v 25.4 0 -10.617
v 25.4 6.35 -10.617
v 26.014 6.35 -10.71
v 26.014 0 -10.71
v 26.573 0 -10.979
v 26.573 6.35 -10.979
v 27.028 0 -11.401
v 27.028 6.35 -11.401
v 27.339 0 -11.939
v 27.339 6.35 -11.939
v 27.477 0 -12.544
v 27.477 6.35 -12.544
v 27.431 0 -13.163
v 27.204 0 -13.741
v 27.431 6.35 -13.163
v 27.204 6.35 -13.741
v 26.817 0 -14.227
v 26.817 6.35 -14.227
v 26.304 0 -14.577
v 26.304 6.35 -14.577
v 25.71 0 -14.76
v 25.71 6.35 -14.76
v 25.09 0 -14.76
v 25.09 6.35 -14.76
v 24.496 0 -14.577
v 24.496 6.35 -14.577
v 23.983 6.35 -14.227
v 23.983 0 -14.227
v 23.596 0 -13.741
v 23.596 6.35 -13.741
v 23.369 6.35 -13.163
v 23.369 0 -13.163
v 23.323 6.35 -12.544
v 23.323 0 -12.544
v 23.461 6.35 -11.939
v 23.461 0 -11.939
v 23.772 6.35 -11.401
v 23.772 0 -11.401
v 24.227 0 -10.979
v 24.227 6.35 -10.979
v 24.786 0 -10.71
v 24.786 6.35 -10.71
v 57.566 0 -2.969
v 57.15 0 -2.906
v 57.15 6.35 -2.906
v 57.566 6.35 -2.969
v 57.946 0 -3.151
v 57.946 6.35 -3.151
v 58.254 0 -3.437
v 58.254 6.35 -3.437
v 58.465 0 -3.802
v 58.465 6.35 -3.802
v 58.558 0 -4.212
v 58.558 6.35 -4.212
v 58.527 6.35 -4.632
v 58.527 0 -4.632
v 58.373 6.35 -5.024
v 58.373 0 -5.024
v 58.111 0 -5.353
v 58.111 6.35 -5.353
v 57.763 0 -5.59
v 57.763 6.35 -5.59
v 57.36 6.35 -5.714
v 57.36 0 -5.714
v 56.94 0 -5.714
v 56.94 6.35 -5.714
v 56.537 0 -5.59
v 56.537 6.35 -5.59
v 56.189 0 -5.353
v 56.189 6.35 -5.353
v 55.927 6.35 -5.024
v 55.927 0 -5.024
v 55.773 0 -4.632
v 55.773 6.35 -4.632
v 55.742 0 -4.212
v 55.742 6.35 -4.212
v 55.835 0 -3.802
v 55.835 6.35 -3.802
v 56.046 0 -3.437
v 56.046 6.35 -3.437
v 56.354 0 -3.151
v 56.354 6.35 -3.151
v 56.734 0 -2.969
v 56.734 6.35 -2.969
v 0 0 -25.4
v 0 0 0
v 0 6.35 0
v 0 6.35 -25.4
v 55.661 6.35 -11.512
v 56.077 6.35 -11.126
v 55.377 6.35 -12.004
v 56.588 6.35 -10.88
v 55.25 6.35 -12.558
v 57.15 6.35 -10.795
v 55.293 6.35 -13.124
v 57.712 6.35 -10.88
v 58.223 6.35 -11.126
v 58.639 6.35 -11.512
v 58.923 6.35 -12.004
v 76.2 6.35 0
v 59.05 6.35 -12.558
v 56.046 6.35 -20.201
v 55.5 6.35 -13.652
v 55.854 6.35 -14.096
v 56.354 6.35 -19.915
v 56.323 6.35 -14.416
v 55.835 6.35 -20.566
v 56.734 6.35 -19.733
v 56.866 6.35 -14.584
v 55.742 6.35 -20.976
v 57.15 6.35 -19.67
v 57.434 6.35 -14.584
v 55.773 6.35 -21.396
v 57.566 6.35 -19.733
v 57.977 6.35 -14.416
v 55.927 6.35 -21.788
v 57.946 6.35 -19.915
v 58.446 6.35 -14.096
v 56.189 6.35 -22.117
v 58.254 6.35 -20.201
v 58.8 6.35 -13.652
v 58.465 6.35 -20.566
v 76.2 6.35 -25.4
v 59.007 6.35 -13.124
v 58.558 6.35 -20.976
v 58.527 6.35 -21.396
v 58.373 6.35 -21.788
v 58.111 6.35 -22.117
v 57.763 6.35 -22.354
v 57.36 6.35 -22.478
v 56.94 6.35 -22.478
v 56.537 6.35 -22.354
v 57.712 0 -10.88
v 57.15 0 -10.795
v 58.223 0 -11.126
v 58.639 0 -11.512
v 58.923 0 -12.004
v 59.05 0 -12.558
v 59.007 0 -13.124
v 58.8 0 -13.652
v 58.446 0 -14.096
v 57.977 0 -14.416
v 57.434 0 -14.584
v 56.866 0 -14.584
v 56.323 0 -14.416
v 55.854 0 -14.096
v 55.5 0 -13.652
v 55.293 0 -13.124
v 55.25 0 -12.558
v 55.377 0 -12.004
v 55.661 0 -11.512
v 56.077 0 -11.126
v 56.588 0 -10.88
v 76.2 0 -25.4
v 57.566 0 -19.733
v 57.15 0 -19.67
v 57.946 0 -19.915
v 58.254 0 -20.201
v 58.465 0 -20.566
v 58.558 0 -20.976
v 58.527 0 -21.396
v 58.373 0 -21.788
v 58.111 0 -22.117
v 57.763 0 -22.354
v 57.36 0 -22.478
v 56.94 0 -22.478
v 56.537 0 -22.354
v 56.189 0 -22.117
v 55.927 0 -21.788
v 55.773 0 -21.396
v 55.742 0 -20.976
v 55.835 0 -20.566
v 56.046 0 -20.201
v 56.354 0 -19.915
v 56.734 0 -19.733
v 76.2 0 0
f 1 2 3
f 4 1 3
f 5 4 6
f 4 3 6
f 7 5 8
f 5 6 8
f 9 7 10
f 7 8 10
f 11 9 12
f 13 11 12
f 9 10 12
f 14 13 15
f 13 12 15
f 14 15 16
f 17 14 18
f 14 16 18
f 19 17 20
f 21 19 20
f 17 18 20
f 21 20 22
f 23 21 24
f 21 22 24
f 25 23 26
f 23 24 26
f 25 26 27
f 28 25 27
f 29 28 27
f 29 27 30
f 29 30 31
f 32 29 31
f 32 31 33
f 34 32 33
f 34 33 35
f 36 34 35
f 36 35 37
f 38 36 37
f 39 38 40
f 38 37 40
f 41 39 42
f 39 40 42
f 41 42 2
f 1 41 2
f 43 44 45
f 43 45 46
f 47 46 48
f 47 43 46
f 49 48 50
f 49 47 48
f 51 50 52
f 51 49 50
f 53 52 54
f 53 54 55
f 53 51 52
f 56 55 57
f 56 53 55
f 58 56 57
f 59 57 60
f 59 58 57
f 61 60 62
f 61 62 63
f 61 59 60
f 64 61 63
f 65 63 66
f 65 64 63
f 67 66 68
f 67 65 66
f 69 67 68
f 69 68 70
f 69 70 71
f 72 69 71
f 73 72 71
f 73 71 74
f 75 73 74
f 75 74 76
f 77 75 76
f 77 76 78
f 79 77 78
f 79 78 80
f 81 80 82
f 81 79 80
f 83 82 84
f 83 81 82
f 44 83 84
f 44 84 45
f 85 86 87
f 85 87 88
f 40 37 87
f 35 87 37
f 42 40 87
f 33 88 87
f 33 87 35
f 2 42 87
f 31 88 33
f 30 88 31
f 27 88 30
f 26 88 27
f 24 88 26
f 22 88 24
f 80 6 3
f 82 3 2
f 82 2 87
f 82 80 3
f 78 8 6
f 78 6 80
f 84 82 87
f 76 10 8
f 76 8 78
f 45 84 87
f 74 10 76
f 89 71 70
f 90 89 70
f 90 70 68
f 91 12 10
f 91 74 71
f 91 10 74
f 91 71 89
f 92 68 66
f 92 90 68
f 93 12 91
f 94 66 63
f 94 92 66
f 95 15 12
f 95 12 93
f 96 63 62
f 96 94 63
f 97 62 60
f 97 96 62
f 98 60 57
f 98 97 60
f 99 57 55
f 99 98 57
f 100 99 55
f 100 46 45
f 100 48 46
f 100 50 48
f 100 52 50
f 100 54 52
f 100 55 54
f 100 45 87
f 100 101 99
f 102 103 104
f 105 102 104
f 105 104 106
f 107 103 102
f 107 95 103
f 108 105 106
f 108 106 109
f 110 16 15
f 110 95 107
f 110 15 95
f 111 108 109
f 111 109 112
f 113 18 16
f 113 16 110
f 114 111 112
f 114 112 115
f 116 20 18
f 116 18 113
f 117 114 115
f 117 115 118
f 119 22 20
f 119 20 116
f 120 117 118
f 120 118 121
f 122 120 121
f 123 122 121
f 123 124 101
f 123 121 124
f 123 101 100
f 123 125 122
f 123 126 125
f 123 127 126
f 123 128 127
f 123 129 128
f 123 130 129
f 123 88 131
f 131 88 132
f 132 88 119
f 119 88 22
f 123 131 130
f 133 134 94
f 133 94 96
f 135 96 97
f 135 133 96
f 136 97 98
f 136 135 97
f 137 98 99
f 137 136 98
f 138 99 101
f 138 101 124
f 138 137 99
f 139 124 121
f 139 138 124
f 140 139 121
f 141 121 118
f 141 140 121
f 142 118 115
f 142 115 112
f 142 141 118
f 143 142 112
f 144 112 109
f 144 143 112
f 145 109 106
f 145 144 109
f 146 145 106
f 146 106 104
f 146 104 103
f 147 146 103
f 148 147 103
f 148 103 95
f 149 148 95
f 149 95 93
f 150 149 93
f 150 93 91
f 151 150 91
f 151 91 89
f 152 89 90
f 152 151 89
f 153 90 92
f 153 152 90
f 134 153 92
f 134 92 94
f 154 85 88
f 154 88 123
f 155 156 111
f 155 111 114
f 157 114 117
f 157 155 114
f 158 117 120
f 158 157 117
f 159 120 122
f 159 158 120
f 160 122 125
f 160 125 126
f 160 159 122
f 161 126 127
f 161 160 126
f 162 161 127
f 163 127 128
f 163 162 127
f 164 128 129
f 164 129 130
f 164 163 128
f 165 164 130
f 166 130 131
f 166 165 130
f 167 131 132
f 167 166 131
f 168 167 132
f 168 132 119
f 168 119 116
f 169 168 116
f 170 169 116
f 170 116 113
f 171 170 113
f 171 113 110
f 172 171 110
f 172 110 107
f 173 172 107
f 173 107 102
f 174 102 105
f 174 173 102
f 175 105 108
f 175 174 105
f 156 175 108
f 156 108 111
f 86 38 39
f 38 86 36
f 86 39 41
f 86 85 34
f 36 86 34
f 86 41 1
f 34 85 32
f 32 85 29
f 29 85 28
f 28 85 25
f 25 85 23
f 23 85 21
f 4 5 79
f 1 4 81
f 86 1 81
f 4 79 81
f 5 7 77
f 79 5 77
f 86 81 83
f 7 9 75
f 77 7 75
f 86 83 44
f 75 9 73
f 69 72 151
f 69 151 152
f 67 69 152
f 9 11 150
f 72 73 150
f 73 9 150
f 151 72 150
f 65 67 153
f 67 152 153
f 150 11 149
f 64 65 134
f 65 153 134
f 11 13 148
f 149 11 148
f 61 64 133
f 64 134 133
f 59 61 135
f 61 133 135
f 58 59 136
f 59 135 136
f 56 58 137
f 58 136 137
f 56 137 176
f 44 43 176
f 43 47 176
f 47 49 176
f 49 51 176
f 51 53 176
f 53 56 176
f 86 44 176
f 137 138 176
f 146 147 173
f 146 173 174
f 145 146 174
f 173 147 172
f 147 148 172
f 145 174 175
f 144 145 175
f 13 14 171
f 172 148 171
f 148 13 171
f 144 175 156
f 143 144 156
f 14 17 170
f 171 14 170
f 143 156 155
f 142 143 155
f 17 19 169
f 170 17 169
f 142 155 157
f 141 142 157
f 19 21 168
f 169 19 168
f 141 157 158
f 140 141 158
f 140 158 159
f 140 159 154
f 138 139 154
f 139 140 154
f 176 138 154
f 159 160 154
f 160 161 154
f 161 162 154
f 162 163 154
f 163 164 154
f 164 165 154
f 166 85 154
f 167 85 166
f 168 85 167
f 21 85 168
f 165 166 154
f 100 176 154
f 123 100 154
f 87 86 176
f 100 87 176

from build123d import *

# Parameters (mm, degrees)
SKETCH2_W           = 76.2
SKETCH2_H           = 25.4
SKETCH2_R           = 1.41224
SKETCH2_R_2         = 1.905
BOSS_EXTRUDE1_DEPTH = 6.35
SKETCH3_R           = 2.0828
CUT_EXTRUDE1_DEPTH  = 6.35


with BuildPart() as part:
    # Sketch2 → Boss-Extrude1 (new body)
    with BuildSketch(Plane(origin=(0, 0, 0), x_dir=(1, 0, 0), z_dir=(0, 1, 0))):
        with Locations((38.1, 12.7)):
            Rectangle(SKETCH2_W, SKETCH2_H)
        with Locations(Location((57.15, 21.082, 0), (0, 0, 270))):
            Circle(SKETCH2_R, mode=Mode.SUBTRACT)
        with Locations(Location((57.15, 4.318, 0), (0, 0, 270))):
            Circle(SKETCH2_R, mode=Mode.SUBTRACT)
        with Locations(Location((57.15, 12.7, 0), (0, 0, 270))):
            Circle(SKETCH2_R_2, mode=Mode.SUBTRACT)
    extrude(amount=BOSS_EXTRUDE1_DEPTH)

    # Sketch3 → Cut-Extrude1 (cut)
    with BuildSketch(Plane(origin=(0, 6.35, 0), x_dir=(1, 0, 0), z_dir=(0, 1, 0))):
        with Locations(Location((25.4, 12.7, 0), (0, 0, 270))):
            Circle(SKETCH3_R)
    extrude(amount=-CUT_EXTRUDE1_DEPTH, mode=Mode.SUBTRACT)


solid = part.part
